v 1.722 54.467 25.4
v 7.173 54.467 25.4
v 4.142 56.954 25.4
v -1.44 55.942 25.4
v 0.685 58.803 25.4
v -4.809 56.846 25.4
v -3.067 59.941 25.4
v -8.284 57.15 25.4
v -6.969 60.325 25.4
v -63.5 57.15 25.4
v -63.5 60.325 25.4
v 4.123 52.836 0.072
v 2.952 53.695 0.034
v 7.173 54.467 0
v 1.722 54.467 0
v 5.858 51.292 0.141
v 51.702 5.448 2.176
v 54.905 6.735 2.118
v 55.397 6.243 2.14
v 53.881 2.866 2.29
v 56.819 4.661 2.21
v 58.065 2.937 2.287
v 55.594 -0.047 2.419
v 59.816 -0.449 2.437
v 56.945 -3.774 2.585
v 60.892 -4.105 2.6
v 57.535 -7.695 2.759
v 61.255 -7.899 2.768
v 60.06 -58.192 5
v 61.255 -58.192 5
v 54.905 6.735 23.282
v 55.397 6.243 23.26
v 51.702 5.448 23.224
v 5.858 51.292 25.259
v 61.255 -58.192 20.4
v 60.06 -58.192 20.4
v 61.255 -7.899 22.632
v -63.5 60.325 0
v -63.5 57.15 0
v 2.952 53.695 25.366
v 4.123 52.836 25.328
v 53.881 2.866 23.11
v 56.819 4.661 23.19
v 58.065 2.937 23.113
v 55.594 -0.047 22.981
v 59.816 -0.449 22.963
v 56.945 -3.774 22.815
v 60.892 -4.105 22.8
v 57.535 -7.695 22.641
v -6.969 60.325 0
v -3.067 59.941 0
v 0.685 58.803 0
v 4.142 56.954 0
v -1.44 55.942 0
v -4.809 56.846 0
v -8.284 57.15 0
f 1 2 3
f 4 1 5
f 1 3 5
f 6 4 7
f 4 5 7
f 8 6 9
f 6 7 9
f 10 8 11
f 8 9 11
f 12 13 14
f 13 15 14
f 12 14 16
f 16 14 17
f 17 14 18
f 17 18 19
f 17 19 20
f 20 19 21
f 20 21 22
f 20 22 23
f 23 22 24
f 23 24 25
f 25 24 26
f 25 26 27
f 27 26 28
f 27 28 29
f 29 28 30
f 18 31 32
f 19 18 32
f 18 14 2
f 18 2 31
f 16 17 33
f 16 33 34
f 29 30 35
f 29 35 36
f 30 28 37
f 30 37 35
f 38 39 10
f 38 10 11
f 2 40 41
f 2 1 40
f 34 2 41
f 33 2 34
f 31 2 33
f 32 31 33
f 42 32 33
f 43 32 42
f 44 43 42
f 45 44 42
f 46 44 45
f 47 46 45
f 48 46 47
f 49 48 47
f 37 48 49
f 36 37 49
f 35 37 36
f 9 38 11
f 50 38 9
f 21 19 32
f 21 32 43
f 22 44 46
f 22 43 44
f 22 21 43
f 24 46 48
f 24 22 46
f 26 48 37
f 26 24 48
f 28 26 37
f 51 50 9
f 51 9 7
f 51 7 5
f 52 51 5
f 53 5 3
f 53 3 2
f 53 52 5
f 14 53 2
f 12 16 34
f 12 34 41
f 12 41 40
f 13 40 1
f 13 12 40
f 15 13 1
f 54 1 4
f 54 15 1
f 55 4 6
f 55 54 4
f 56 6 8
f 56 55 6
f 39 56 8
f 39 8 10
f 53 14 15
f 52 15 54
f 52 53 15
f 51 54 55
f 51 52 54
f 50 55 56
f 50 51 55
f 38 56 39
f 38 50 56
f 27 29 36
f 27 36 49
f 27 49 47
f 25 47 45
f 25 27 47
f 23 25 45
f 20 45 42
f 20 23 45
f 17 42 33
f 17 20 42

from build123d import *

# Parameters (mm, degrees)
BOSS_EXTRUDE1_DEPTH = 25.4
CUT_EXTRUDE1_DEPTH  = 165.4


with BuildPart() as part:
    # Sketch1 → Boss-Extrude1 (new body)
    with BuildSketch(Plane.XY):
        with BuildLine():
            ThreePointArc((5.857864376, 51.292135624), (-0.6306026, 55.62759065), (-8.284271247, 57.15))
            Line((-8.284271247, 57.15), (-63.5, 57.15))
            Line((-63.5, 57.15), (-63.5, 60.325))
            Line((-63.5, 60.325), (-6.969143187, 60.325))
            ThreePointArc((-6.969143187, 60.325), (0.68452546, 58.80259065), (7.172992437, 54.467135624))
            Line((7.172992437, 54.467135624), (6.735192091, 54.90493597))
            Line((6.735192091, 54.90493597), (54.90493597, 6.735192091))
            Line((54.90493597, 6.735192091), (55.397071593, 6.243056467))
            ThreePointArc((55.397071593, 6.243056467), (59.73252662, -0.245410509), (61.25493597, -7.899079157))
            Line((61.25493597, -7.899079157), (61.25493597, -58.192189171))
            Line((61.25493597, -58.192189171), (60.059609459, -58.192189171))
            Line((60.059609459, -58.192189171), (57.534761691, -7.695233822))
            ThreePointArc((57.534761691, -7.695233822), (55.840378599, -0.581197787), (51.701850537, 5.448149463))
            Line((51.701850537, 5.448149463), (5.857864376, 51.292135624))
        make_face()
    extrude(amount=BOSS_EXTRUDE1_DEPTH)

    # Sketch2 → Cut-Extrude1 (cut)
    with BuildSketch(Plane(origin=(61.25493597, 0, 0), x_dir=(0, 0, -1), z_dir=(1, 0, 0))):
        Polygon((-25.4, 54.467135624), (-20.4, -58.192189171), (-53.926173028, -59.680134048), align=None)
        Polygon((0, 54.467135624), (-5, -58.192189171), (16.325141492, -58.192189171), align=None)
    extrude(amount=-CUT_EXTRUDE1_DEPTH, mode=Mode.SUBTRACT)


solid = part.part
